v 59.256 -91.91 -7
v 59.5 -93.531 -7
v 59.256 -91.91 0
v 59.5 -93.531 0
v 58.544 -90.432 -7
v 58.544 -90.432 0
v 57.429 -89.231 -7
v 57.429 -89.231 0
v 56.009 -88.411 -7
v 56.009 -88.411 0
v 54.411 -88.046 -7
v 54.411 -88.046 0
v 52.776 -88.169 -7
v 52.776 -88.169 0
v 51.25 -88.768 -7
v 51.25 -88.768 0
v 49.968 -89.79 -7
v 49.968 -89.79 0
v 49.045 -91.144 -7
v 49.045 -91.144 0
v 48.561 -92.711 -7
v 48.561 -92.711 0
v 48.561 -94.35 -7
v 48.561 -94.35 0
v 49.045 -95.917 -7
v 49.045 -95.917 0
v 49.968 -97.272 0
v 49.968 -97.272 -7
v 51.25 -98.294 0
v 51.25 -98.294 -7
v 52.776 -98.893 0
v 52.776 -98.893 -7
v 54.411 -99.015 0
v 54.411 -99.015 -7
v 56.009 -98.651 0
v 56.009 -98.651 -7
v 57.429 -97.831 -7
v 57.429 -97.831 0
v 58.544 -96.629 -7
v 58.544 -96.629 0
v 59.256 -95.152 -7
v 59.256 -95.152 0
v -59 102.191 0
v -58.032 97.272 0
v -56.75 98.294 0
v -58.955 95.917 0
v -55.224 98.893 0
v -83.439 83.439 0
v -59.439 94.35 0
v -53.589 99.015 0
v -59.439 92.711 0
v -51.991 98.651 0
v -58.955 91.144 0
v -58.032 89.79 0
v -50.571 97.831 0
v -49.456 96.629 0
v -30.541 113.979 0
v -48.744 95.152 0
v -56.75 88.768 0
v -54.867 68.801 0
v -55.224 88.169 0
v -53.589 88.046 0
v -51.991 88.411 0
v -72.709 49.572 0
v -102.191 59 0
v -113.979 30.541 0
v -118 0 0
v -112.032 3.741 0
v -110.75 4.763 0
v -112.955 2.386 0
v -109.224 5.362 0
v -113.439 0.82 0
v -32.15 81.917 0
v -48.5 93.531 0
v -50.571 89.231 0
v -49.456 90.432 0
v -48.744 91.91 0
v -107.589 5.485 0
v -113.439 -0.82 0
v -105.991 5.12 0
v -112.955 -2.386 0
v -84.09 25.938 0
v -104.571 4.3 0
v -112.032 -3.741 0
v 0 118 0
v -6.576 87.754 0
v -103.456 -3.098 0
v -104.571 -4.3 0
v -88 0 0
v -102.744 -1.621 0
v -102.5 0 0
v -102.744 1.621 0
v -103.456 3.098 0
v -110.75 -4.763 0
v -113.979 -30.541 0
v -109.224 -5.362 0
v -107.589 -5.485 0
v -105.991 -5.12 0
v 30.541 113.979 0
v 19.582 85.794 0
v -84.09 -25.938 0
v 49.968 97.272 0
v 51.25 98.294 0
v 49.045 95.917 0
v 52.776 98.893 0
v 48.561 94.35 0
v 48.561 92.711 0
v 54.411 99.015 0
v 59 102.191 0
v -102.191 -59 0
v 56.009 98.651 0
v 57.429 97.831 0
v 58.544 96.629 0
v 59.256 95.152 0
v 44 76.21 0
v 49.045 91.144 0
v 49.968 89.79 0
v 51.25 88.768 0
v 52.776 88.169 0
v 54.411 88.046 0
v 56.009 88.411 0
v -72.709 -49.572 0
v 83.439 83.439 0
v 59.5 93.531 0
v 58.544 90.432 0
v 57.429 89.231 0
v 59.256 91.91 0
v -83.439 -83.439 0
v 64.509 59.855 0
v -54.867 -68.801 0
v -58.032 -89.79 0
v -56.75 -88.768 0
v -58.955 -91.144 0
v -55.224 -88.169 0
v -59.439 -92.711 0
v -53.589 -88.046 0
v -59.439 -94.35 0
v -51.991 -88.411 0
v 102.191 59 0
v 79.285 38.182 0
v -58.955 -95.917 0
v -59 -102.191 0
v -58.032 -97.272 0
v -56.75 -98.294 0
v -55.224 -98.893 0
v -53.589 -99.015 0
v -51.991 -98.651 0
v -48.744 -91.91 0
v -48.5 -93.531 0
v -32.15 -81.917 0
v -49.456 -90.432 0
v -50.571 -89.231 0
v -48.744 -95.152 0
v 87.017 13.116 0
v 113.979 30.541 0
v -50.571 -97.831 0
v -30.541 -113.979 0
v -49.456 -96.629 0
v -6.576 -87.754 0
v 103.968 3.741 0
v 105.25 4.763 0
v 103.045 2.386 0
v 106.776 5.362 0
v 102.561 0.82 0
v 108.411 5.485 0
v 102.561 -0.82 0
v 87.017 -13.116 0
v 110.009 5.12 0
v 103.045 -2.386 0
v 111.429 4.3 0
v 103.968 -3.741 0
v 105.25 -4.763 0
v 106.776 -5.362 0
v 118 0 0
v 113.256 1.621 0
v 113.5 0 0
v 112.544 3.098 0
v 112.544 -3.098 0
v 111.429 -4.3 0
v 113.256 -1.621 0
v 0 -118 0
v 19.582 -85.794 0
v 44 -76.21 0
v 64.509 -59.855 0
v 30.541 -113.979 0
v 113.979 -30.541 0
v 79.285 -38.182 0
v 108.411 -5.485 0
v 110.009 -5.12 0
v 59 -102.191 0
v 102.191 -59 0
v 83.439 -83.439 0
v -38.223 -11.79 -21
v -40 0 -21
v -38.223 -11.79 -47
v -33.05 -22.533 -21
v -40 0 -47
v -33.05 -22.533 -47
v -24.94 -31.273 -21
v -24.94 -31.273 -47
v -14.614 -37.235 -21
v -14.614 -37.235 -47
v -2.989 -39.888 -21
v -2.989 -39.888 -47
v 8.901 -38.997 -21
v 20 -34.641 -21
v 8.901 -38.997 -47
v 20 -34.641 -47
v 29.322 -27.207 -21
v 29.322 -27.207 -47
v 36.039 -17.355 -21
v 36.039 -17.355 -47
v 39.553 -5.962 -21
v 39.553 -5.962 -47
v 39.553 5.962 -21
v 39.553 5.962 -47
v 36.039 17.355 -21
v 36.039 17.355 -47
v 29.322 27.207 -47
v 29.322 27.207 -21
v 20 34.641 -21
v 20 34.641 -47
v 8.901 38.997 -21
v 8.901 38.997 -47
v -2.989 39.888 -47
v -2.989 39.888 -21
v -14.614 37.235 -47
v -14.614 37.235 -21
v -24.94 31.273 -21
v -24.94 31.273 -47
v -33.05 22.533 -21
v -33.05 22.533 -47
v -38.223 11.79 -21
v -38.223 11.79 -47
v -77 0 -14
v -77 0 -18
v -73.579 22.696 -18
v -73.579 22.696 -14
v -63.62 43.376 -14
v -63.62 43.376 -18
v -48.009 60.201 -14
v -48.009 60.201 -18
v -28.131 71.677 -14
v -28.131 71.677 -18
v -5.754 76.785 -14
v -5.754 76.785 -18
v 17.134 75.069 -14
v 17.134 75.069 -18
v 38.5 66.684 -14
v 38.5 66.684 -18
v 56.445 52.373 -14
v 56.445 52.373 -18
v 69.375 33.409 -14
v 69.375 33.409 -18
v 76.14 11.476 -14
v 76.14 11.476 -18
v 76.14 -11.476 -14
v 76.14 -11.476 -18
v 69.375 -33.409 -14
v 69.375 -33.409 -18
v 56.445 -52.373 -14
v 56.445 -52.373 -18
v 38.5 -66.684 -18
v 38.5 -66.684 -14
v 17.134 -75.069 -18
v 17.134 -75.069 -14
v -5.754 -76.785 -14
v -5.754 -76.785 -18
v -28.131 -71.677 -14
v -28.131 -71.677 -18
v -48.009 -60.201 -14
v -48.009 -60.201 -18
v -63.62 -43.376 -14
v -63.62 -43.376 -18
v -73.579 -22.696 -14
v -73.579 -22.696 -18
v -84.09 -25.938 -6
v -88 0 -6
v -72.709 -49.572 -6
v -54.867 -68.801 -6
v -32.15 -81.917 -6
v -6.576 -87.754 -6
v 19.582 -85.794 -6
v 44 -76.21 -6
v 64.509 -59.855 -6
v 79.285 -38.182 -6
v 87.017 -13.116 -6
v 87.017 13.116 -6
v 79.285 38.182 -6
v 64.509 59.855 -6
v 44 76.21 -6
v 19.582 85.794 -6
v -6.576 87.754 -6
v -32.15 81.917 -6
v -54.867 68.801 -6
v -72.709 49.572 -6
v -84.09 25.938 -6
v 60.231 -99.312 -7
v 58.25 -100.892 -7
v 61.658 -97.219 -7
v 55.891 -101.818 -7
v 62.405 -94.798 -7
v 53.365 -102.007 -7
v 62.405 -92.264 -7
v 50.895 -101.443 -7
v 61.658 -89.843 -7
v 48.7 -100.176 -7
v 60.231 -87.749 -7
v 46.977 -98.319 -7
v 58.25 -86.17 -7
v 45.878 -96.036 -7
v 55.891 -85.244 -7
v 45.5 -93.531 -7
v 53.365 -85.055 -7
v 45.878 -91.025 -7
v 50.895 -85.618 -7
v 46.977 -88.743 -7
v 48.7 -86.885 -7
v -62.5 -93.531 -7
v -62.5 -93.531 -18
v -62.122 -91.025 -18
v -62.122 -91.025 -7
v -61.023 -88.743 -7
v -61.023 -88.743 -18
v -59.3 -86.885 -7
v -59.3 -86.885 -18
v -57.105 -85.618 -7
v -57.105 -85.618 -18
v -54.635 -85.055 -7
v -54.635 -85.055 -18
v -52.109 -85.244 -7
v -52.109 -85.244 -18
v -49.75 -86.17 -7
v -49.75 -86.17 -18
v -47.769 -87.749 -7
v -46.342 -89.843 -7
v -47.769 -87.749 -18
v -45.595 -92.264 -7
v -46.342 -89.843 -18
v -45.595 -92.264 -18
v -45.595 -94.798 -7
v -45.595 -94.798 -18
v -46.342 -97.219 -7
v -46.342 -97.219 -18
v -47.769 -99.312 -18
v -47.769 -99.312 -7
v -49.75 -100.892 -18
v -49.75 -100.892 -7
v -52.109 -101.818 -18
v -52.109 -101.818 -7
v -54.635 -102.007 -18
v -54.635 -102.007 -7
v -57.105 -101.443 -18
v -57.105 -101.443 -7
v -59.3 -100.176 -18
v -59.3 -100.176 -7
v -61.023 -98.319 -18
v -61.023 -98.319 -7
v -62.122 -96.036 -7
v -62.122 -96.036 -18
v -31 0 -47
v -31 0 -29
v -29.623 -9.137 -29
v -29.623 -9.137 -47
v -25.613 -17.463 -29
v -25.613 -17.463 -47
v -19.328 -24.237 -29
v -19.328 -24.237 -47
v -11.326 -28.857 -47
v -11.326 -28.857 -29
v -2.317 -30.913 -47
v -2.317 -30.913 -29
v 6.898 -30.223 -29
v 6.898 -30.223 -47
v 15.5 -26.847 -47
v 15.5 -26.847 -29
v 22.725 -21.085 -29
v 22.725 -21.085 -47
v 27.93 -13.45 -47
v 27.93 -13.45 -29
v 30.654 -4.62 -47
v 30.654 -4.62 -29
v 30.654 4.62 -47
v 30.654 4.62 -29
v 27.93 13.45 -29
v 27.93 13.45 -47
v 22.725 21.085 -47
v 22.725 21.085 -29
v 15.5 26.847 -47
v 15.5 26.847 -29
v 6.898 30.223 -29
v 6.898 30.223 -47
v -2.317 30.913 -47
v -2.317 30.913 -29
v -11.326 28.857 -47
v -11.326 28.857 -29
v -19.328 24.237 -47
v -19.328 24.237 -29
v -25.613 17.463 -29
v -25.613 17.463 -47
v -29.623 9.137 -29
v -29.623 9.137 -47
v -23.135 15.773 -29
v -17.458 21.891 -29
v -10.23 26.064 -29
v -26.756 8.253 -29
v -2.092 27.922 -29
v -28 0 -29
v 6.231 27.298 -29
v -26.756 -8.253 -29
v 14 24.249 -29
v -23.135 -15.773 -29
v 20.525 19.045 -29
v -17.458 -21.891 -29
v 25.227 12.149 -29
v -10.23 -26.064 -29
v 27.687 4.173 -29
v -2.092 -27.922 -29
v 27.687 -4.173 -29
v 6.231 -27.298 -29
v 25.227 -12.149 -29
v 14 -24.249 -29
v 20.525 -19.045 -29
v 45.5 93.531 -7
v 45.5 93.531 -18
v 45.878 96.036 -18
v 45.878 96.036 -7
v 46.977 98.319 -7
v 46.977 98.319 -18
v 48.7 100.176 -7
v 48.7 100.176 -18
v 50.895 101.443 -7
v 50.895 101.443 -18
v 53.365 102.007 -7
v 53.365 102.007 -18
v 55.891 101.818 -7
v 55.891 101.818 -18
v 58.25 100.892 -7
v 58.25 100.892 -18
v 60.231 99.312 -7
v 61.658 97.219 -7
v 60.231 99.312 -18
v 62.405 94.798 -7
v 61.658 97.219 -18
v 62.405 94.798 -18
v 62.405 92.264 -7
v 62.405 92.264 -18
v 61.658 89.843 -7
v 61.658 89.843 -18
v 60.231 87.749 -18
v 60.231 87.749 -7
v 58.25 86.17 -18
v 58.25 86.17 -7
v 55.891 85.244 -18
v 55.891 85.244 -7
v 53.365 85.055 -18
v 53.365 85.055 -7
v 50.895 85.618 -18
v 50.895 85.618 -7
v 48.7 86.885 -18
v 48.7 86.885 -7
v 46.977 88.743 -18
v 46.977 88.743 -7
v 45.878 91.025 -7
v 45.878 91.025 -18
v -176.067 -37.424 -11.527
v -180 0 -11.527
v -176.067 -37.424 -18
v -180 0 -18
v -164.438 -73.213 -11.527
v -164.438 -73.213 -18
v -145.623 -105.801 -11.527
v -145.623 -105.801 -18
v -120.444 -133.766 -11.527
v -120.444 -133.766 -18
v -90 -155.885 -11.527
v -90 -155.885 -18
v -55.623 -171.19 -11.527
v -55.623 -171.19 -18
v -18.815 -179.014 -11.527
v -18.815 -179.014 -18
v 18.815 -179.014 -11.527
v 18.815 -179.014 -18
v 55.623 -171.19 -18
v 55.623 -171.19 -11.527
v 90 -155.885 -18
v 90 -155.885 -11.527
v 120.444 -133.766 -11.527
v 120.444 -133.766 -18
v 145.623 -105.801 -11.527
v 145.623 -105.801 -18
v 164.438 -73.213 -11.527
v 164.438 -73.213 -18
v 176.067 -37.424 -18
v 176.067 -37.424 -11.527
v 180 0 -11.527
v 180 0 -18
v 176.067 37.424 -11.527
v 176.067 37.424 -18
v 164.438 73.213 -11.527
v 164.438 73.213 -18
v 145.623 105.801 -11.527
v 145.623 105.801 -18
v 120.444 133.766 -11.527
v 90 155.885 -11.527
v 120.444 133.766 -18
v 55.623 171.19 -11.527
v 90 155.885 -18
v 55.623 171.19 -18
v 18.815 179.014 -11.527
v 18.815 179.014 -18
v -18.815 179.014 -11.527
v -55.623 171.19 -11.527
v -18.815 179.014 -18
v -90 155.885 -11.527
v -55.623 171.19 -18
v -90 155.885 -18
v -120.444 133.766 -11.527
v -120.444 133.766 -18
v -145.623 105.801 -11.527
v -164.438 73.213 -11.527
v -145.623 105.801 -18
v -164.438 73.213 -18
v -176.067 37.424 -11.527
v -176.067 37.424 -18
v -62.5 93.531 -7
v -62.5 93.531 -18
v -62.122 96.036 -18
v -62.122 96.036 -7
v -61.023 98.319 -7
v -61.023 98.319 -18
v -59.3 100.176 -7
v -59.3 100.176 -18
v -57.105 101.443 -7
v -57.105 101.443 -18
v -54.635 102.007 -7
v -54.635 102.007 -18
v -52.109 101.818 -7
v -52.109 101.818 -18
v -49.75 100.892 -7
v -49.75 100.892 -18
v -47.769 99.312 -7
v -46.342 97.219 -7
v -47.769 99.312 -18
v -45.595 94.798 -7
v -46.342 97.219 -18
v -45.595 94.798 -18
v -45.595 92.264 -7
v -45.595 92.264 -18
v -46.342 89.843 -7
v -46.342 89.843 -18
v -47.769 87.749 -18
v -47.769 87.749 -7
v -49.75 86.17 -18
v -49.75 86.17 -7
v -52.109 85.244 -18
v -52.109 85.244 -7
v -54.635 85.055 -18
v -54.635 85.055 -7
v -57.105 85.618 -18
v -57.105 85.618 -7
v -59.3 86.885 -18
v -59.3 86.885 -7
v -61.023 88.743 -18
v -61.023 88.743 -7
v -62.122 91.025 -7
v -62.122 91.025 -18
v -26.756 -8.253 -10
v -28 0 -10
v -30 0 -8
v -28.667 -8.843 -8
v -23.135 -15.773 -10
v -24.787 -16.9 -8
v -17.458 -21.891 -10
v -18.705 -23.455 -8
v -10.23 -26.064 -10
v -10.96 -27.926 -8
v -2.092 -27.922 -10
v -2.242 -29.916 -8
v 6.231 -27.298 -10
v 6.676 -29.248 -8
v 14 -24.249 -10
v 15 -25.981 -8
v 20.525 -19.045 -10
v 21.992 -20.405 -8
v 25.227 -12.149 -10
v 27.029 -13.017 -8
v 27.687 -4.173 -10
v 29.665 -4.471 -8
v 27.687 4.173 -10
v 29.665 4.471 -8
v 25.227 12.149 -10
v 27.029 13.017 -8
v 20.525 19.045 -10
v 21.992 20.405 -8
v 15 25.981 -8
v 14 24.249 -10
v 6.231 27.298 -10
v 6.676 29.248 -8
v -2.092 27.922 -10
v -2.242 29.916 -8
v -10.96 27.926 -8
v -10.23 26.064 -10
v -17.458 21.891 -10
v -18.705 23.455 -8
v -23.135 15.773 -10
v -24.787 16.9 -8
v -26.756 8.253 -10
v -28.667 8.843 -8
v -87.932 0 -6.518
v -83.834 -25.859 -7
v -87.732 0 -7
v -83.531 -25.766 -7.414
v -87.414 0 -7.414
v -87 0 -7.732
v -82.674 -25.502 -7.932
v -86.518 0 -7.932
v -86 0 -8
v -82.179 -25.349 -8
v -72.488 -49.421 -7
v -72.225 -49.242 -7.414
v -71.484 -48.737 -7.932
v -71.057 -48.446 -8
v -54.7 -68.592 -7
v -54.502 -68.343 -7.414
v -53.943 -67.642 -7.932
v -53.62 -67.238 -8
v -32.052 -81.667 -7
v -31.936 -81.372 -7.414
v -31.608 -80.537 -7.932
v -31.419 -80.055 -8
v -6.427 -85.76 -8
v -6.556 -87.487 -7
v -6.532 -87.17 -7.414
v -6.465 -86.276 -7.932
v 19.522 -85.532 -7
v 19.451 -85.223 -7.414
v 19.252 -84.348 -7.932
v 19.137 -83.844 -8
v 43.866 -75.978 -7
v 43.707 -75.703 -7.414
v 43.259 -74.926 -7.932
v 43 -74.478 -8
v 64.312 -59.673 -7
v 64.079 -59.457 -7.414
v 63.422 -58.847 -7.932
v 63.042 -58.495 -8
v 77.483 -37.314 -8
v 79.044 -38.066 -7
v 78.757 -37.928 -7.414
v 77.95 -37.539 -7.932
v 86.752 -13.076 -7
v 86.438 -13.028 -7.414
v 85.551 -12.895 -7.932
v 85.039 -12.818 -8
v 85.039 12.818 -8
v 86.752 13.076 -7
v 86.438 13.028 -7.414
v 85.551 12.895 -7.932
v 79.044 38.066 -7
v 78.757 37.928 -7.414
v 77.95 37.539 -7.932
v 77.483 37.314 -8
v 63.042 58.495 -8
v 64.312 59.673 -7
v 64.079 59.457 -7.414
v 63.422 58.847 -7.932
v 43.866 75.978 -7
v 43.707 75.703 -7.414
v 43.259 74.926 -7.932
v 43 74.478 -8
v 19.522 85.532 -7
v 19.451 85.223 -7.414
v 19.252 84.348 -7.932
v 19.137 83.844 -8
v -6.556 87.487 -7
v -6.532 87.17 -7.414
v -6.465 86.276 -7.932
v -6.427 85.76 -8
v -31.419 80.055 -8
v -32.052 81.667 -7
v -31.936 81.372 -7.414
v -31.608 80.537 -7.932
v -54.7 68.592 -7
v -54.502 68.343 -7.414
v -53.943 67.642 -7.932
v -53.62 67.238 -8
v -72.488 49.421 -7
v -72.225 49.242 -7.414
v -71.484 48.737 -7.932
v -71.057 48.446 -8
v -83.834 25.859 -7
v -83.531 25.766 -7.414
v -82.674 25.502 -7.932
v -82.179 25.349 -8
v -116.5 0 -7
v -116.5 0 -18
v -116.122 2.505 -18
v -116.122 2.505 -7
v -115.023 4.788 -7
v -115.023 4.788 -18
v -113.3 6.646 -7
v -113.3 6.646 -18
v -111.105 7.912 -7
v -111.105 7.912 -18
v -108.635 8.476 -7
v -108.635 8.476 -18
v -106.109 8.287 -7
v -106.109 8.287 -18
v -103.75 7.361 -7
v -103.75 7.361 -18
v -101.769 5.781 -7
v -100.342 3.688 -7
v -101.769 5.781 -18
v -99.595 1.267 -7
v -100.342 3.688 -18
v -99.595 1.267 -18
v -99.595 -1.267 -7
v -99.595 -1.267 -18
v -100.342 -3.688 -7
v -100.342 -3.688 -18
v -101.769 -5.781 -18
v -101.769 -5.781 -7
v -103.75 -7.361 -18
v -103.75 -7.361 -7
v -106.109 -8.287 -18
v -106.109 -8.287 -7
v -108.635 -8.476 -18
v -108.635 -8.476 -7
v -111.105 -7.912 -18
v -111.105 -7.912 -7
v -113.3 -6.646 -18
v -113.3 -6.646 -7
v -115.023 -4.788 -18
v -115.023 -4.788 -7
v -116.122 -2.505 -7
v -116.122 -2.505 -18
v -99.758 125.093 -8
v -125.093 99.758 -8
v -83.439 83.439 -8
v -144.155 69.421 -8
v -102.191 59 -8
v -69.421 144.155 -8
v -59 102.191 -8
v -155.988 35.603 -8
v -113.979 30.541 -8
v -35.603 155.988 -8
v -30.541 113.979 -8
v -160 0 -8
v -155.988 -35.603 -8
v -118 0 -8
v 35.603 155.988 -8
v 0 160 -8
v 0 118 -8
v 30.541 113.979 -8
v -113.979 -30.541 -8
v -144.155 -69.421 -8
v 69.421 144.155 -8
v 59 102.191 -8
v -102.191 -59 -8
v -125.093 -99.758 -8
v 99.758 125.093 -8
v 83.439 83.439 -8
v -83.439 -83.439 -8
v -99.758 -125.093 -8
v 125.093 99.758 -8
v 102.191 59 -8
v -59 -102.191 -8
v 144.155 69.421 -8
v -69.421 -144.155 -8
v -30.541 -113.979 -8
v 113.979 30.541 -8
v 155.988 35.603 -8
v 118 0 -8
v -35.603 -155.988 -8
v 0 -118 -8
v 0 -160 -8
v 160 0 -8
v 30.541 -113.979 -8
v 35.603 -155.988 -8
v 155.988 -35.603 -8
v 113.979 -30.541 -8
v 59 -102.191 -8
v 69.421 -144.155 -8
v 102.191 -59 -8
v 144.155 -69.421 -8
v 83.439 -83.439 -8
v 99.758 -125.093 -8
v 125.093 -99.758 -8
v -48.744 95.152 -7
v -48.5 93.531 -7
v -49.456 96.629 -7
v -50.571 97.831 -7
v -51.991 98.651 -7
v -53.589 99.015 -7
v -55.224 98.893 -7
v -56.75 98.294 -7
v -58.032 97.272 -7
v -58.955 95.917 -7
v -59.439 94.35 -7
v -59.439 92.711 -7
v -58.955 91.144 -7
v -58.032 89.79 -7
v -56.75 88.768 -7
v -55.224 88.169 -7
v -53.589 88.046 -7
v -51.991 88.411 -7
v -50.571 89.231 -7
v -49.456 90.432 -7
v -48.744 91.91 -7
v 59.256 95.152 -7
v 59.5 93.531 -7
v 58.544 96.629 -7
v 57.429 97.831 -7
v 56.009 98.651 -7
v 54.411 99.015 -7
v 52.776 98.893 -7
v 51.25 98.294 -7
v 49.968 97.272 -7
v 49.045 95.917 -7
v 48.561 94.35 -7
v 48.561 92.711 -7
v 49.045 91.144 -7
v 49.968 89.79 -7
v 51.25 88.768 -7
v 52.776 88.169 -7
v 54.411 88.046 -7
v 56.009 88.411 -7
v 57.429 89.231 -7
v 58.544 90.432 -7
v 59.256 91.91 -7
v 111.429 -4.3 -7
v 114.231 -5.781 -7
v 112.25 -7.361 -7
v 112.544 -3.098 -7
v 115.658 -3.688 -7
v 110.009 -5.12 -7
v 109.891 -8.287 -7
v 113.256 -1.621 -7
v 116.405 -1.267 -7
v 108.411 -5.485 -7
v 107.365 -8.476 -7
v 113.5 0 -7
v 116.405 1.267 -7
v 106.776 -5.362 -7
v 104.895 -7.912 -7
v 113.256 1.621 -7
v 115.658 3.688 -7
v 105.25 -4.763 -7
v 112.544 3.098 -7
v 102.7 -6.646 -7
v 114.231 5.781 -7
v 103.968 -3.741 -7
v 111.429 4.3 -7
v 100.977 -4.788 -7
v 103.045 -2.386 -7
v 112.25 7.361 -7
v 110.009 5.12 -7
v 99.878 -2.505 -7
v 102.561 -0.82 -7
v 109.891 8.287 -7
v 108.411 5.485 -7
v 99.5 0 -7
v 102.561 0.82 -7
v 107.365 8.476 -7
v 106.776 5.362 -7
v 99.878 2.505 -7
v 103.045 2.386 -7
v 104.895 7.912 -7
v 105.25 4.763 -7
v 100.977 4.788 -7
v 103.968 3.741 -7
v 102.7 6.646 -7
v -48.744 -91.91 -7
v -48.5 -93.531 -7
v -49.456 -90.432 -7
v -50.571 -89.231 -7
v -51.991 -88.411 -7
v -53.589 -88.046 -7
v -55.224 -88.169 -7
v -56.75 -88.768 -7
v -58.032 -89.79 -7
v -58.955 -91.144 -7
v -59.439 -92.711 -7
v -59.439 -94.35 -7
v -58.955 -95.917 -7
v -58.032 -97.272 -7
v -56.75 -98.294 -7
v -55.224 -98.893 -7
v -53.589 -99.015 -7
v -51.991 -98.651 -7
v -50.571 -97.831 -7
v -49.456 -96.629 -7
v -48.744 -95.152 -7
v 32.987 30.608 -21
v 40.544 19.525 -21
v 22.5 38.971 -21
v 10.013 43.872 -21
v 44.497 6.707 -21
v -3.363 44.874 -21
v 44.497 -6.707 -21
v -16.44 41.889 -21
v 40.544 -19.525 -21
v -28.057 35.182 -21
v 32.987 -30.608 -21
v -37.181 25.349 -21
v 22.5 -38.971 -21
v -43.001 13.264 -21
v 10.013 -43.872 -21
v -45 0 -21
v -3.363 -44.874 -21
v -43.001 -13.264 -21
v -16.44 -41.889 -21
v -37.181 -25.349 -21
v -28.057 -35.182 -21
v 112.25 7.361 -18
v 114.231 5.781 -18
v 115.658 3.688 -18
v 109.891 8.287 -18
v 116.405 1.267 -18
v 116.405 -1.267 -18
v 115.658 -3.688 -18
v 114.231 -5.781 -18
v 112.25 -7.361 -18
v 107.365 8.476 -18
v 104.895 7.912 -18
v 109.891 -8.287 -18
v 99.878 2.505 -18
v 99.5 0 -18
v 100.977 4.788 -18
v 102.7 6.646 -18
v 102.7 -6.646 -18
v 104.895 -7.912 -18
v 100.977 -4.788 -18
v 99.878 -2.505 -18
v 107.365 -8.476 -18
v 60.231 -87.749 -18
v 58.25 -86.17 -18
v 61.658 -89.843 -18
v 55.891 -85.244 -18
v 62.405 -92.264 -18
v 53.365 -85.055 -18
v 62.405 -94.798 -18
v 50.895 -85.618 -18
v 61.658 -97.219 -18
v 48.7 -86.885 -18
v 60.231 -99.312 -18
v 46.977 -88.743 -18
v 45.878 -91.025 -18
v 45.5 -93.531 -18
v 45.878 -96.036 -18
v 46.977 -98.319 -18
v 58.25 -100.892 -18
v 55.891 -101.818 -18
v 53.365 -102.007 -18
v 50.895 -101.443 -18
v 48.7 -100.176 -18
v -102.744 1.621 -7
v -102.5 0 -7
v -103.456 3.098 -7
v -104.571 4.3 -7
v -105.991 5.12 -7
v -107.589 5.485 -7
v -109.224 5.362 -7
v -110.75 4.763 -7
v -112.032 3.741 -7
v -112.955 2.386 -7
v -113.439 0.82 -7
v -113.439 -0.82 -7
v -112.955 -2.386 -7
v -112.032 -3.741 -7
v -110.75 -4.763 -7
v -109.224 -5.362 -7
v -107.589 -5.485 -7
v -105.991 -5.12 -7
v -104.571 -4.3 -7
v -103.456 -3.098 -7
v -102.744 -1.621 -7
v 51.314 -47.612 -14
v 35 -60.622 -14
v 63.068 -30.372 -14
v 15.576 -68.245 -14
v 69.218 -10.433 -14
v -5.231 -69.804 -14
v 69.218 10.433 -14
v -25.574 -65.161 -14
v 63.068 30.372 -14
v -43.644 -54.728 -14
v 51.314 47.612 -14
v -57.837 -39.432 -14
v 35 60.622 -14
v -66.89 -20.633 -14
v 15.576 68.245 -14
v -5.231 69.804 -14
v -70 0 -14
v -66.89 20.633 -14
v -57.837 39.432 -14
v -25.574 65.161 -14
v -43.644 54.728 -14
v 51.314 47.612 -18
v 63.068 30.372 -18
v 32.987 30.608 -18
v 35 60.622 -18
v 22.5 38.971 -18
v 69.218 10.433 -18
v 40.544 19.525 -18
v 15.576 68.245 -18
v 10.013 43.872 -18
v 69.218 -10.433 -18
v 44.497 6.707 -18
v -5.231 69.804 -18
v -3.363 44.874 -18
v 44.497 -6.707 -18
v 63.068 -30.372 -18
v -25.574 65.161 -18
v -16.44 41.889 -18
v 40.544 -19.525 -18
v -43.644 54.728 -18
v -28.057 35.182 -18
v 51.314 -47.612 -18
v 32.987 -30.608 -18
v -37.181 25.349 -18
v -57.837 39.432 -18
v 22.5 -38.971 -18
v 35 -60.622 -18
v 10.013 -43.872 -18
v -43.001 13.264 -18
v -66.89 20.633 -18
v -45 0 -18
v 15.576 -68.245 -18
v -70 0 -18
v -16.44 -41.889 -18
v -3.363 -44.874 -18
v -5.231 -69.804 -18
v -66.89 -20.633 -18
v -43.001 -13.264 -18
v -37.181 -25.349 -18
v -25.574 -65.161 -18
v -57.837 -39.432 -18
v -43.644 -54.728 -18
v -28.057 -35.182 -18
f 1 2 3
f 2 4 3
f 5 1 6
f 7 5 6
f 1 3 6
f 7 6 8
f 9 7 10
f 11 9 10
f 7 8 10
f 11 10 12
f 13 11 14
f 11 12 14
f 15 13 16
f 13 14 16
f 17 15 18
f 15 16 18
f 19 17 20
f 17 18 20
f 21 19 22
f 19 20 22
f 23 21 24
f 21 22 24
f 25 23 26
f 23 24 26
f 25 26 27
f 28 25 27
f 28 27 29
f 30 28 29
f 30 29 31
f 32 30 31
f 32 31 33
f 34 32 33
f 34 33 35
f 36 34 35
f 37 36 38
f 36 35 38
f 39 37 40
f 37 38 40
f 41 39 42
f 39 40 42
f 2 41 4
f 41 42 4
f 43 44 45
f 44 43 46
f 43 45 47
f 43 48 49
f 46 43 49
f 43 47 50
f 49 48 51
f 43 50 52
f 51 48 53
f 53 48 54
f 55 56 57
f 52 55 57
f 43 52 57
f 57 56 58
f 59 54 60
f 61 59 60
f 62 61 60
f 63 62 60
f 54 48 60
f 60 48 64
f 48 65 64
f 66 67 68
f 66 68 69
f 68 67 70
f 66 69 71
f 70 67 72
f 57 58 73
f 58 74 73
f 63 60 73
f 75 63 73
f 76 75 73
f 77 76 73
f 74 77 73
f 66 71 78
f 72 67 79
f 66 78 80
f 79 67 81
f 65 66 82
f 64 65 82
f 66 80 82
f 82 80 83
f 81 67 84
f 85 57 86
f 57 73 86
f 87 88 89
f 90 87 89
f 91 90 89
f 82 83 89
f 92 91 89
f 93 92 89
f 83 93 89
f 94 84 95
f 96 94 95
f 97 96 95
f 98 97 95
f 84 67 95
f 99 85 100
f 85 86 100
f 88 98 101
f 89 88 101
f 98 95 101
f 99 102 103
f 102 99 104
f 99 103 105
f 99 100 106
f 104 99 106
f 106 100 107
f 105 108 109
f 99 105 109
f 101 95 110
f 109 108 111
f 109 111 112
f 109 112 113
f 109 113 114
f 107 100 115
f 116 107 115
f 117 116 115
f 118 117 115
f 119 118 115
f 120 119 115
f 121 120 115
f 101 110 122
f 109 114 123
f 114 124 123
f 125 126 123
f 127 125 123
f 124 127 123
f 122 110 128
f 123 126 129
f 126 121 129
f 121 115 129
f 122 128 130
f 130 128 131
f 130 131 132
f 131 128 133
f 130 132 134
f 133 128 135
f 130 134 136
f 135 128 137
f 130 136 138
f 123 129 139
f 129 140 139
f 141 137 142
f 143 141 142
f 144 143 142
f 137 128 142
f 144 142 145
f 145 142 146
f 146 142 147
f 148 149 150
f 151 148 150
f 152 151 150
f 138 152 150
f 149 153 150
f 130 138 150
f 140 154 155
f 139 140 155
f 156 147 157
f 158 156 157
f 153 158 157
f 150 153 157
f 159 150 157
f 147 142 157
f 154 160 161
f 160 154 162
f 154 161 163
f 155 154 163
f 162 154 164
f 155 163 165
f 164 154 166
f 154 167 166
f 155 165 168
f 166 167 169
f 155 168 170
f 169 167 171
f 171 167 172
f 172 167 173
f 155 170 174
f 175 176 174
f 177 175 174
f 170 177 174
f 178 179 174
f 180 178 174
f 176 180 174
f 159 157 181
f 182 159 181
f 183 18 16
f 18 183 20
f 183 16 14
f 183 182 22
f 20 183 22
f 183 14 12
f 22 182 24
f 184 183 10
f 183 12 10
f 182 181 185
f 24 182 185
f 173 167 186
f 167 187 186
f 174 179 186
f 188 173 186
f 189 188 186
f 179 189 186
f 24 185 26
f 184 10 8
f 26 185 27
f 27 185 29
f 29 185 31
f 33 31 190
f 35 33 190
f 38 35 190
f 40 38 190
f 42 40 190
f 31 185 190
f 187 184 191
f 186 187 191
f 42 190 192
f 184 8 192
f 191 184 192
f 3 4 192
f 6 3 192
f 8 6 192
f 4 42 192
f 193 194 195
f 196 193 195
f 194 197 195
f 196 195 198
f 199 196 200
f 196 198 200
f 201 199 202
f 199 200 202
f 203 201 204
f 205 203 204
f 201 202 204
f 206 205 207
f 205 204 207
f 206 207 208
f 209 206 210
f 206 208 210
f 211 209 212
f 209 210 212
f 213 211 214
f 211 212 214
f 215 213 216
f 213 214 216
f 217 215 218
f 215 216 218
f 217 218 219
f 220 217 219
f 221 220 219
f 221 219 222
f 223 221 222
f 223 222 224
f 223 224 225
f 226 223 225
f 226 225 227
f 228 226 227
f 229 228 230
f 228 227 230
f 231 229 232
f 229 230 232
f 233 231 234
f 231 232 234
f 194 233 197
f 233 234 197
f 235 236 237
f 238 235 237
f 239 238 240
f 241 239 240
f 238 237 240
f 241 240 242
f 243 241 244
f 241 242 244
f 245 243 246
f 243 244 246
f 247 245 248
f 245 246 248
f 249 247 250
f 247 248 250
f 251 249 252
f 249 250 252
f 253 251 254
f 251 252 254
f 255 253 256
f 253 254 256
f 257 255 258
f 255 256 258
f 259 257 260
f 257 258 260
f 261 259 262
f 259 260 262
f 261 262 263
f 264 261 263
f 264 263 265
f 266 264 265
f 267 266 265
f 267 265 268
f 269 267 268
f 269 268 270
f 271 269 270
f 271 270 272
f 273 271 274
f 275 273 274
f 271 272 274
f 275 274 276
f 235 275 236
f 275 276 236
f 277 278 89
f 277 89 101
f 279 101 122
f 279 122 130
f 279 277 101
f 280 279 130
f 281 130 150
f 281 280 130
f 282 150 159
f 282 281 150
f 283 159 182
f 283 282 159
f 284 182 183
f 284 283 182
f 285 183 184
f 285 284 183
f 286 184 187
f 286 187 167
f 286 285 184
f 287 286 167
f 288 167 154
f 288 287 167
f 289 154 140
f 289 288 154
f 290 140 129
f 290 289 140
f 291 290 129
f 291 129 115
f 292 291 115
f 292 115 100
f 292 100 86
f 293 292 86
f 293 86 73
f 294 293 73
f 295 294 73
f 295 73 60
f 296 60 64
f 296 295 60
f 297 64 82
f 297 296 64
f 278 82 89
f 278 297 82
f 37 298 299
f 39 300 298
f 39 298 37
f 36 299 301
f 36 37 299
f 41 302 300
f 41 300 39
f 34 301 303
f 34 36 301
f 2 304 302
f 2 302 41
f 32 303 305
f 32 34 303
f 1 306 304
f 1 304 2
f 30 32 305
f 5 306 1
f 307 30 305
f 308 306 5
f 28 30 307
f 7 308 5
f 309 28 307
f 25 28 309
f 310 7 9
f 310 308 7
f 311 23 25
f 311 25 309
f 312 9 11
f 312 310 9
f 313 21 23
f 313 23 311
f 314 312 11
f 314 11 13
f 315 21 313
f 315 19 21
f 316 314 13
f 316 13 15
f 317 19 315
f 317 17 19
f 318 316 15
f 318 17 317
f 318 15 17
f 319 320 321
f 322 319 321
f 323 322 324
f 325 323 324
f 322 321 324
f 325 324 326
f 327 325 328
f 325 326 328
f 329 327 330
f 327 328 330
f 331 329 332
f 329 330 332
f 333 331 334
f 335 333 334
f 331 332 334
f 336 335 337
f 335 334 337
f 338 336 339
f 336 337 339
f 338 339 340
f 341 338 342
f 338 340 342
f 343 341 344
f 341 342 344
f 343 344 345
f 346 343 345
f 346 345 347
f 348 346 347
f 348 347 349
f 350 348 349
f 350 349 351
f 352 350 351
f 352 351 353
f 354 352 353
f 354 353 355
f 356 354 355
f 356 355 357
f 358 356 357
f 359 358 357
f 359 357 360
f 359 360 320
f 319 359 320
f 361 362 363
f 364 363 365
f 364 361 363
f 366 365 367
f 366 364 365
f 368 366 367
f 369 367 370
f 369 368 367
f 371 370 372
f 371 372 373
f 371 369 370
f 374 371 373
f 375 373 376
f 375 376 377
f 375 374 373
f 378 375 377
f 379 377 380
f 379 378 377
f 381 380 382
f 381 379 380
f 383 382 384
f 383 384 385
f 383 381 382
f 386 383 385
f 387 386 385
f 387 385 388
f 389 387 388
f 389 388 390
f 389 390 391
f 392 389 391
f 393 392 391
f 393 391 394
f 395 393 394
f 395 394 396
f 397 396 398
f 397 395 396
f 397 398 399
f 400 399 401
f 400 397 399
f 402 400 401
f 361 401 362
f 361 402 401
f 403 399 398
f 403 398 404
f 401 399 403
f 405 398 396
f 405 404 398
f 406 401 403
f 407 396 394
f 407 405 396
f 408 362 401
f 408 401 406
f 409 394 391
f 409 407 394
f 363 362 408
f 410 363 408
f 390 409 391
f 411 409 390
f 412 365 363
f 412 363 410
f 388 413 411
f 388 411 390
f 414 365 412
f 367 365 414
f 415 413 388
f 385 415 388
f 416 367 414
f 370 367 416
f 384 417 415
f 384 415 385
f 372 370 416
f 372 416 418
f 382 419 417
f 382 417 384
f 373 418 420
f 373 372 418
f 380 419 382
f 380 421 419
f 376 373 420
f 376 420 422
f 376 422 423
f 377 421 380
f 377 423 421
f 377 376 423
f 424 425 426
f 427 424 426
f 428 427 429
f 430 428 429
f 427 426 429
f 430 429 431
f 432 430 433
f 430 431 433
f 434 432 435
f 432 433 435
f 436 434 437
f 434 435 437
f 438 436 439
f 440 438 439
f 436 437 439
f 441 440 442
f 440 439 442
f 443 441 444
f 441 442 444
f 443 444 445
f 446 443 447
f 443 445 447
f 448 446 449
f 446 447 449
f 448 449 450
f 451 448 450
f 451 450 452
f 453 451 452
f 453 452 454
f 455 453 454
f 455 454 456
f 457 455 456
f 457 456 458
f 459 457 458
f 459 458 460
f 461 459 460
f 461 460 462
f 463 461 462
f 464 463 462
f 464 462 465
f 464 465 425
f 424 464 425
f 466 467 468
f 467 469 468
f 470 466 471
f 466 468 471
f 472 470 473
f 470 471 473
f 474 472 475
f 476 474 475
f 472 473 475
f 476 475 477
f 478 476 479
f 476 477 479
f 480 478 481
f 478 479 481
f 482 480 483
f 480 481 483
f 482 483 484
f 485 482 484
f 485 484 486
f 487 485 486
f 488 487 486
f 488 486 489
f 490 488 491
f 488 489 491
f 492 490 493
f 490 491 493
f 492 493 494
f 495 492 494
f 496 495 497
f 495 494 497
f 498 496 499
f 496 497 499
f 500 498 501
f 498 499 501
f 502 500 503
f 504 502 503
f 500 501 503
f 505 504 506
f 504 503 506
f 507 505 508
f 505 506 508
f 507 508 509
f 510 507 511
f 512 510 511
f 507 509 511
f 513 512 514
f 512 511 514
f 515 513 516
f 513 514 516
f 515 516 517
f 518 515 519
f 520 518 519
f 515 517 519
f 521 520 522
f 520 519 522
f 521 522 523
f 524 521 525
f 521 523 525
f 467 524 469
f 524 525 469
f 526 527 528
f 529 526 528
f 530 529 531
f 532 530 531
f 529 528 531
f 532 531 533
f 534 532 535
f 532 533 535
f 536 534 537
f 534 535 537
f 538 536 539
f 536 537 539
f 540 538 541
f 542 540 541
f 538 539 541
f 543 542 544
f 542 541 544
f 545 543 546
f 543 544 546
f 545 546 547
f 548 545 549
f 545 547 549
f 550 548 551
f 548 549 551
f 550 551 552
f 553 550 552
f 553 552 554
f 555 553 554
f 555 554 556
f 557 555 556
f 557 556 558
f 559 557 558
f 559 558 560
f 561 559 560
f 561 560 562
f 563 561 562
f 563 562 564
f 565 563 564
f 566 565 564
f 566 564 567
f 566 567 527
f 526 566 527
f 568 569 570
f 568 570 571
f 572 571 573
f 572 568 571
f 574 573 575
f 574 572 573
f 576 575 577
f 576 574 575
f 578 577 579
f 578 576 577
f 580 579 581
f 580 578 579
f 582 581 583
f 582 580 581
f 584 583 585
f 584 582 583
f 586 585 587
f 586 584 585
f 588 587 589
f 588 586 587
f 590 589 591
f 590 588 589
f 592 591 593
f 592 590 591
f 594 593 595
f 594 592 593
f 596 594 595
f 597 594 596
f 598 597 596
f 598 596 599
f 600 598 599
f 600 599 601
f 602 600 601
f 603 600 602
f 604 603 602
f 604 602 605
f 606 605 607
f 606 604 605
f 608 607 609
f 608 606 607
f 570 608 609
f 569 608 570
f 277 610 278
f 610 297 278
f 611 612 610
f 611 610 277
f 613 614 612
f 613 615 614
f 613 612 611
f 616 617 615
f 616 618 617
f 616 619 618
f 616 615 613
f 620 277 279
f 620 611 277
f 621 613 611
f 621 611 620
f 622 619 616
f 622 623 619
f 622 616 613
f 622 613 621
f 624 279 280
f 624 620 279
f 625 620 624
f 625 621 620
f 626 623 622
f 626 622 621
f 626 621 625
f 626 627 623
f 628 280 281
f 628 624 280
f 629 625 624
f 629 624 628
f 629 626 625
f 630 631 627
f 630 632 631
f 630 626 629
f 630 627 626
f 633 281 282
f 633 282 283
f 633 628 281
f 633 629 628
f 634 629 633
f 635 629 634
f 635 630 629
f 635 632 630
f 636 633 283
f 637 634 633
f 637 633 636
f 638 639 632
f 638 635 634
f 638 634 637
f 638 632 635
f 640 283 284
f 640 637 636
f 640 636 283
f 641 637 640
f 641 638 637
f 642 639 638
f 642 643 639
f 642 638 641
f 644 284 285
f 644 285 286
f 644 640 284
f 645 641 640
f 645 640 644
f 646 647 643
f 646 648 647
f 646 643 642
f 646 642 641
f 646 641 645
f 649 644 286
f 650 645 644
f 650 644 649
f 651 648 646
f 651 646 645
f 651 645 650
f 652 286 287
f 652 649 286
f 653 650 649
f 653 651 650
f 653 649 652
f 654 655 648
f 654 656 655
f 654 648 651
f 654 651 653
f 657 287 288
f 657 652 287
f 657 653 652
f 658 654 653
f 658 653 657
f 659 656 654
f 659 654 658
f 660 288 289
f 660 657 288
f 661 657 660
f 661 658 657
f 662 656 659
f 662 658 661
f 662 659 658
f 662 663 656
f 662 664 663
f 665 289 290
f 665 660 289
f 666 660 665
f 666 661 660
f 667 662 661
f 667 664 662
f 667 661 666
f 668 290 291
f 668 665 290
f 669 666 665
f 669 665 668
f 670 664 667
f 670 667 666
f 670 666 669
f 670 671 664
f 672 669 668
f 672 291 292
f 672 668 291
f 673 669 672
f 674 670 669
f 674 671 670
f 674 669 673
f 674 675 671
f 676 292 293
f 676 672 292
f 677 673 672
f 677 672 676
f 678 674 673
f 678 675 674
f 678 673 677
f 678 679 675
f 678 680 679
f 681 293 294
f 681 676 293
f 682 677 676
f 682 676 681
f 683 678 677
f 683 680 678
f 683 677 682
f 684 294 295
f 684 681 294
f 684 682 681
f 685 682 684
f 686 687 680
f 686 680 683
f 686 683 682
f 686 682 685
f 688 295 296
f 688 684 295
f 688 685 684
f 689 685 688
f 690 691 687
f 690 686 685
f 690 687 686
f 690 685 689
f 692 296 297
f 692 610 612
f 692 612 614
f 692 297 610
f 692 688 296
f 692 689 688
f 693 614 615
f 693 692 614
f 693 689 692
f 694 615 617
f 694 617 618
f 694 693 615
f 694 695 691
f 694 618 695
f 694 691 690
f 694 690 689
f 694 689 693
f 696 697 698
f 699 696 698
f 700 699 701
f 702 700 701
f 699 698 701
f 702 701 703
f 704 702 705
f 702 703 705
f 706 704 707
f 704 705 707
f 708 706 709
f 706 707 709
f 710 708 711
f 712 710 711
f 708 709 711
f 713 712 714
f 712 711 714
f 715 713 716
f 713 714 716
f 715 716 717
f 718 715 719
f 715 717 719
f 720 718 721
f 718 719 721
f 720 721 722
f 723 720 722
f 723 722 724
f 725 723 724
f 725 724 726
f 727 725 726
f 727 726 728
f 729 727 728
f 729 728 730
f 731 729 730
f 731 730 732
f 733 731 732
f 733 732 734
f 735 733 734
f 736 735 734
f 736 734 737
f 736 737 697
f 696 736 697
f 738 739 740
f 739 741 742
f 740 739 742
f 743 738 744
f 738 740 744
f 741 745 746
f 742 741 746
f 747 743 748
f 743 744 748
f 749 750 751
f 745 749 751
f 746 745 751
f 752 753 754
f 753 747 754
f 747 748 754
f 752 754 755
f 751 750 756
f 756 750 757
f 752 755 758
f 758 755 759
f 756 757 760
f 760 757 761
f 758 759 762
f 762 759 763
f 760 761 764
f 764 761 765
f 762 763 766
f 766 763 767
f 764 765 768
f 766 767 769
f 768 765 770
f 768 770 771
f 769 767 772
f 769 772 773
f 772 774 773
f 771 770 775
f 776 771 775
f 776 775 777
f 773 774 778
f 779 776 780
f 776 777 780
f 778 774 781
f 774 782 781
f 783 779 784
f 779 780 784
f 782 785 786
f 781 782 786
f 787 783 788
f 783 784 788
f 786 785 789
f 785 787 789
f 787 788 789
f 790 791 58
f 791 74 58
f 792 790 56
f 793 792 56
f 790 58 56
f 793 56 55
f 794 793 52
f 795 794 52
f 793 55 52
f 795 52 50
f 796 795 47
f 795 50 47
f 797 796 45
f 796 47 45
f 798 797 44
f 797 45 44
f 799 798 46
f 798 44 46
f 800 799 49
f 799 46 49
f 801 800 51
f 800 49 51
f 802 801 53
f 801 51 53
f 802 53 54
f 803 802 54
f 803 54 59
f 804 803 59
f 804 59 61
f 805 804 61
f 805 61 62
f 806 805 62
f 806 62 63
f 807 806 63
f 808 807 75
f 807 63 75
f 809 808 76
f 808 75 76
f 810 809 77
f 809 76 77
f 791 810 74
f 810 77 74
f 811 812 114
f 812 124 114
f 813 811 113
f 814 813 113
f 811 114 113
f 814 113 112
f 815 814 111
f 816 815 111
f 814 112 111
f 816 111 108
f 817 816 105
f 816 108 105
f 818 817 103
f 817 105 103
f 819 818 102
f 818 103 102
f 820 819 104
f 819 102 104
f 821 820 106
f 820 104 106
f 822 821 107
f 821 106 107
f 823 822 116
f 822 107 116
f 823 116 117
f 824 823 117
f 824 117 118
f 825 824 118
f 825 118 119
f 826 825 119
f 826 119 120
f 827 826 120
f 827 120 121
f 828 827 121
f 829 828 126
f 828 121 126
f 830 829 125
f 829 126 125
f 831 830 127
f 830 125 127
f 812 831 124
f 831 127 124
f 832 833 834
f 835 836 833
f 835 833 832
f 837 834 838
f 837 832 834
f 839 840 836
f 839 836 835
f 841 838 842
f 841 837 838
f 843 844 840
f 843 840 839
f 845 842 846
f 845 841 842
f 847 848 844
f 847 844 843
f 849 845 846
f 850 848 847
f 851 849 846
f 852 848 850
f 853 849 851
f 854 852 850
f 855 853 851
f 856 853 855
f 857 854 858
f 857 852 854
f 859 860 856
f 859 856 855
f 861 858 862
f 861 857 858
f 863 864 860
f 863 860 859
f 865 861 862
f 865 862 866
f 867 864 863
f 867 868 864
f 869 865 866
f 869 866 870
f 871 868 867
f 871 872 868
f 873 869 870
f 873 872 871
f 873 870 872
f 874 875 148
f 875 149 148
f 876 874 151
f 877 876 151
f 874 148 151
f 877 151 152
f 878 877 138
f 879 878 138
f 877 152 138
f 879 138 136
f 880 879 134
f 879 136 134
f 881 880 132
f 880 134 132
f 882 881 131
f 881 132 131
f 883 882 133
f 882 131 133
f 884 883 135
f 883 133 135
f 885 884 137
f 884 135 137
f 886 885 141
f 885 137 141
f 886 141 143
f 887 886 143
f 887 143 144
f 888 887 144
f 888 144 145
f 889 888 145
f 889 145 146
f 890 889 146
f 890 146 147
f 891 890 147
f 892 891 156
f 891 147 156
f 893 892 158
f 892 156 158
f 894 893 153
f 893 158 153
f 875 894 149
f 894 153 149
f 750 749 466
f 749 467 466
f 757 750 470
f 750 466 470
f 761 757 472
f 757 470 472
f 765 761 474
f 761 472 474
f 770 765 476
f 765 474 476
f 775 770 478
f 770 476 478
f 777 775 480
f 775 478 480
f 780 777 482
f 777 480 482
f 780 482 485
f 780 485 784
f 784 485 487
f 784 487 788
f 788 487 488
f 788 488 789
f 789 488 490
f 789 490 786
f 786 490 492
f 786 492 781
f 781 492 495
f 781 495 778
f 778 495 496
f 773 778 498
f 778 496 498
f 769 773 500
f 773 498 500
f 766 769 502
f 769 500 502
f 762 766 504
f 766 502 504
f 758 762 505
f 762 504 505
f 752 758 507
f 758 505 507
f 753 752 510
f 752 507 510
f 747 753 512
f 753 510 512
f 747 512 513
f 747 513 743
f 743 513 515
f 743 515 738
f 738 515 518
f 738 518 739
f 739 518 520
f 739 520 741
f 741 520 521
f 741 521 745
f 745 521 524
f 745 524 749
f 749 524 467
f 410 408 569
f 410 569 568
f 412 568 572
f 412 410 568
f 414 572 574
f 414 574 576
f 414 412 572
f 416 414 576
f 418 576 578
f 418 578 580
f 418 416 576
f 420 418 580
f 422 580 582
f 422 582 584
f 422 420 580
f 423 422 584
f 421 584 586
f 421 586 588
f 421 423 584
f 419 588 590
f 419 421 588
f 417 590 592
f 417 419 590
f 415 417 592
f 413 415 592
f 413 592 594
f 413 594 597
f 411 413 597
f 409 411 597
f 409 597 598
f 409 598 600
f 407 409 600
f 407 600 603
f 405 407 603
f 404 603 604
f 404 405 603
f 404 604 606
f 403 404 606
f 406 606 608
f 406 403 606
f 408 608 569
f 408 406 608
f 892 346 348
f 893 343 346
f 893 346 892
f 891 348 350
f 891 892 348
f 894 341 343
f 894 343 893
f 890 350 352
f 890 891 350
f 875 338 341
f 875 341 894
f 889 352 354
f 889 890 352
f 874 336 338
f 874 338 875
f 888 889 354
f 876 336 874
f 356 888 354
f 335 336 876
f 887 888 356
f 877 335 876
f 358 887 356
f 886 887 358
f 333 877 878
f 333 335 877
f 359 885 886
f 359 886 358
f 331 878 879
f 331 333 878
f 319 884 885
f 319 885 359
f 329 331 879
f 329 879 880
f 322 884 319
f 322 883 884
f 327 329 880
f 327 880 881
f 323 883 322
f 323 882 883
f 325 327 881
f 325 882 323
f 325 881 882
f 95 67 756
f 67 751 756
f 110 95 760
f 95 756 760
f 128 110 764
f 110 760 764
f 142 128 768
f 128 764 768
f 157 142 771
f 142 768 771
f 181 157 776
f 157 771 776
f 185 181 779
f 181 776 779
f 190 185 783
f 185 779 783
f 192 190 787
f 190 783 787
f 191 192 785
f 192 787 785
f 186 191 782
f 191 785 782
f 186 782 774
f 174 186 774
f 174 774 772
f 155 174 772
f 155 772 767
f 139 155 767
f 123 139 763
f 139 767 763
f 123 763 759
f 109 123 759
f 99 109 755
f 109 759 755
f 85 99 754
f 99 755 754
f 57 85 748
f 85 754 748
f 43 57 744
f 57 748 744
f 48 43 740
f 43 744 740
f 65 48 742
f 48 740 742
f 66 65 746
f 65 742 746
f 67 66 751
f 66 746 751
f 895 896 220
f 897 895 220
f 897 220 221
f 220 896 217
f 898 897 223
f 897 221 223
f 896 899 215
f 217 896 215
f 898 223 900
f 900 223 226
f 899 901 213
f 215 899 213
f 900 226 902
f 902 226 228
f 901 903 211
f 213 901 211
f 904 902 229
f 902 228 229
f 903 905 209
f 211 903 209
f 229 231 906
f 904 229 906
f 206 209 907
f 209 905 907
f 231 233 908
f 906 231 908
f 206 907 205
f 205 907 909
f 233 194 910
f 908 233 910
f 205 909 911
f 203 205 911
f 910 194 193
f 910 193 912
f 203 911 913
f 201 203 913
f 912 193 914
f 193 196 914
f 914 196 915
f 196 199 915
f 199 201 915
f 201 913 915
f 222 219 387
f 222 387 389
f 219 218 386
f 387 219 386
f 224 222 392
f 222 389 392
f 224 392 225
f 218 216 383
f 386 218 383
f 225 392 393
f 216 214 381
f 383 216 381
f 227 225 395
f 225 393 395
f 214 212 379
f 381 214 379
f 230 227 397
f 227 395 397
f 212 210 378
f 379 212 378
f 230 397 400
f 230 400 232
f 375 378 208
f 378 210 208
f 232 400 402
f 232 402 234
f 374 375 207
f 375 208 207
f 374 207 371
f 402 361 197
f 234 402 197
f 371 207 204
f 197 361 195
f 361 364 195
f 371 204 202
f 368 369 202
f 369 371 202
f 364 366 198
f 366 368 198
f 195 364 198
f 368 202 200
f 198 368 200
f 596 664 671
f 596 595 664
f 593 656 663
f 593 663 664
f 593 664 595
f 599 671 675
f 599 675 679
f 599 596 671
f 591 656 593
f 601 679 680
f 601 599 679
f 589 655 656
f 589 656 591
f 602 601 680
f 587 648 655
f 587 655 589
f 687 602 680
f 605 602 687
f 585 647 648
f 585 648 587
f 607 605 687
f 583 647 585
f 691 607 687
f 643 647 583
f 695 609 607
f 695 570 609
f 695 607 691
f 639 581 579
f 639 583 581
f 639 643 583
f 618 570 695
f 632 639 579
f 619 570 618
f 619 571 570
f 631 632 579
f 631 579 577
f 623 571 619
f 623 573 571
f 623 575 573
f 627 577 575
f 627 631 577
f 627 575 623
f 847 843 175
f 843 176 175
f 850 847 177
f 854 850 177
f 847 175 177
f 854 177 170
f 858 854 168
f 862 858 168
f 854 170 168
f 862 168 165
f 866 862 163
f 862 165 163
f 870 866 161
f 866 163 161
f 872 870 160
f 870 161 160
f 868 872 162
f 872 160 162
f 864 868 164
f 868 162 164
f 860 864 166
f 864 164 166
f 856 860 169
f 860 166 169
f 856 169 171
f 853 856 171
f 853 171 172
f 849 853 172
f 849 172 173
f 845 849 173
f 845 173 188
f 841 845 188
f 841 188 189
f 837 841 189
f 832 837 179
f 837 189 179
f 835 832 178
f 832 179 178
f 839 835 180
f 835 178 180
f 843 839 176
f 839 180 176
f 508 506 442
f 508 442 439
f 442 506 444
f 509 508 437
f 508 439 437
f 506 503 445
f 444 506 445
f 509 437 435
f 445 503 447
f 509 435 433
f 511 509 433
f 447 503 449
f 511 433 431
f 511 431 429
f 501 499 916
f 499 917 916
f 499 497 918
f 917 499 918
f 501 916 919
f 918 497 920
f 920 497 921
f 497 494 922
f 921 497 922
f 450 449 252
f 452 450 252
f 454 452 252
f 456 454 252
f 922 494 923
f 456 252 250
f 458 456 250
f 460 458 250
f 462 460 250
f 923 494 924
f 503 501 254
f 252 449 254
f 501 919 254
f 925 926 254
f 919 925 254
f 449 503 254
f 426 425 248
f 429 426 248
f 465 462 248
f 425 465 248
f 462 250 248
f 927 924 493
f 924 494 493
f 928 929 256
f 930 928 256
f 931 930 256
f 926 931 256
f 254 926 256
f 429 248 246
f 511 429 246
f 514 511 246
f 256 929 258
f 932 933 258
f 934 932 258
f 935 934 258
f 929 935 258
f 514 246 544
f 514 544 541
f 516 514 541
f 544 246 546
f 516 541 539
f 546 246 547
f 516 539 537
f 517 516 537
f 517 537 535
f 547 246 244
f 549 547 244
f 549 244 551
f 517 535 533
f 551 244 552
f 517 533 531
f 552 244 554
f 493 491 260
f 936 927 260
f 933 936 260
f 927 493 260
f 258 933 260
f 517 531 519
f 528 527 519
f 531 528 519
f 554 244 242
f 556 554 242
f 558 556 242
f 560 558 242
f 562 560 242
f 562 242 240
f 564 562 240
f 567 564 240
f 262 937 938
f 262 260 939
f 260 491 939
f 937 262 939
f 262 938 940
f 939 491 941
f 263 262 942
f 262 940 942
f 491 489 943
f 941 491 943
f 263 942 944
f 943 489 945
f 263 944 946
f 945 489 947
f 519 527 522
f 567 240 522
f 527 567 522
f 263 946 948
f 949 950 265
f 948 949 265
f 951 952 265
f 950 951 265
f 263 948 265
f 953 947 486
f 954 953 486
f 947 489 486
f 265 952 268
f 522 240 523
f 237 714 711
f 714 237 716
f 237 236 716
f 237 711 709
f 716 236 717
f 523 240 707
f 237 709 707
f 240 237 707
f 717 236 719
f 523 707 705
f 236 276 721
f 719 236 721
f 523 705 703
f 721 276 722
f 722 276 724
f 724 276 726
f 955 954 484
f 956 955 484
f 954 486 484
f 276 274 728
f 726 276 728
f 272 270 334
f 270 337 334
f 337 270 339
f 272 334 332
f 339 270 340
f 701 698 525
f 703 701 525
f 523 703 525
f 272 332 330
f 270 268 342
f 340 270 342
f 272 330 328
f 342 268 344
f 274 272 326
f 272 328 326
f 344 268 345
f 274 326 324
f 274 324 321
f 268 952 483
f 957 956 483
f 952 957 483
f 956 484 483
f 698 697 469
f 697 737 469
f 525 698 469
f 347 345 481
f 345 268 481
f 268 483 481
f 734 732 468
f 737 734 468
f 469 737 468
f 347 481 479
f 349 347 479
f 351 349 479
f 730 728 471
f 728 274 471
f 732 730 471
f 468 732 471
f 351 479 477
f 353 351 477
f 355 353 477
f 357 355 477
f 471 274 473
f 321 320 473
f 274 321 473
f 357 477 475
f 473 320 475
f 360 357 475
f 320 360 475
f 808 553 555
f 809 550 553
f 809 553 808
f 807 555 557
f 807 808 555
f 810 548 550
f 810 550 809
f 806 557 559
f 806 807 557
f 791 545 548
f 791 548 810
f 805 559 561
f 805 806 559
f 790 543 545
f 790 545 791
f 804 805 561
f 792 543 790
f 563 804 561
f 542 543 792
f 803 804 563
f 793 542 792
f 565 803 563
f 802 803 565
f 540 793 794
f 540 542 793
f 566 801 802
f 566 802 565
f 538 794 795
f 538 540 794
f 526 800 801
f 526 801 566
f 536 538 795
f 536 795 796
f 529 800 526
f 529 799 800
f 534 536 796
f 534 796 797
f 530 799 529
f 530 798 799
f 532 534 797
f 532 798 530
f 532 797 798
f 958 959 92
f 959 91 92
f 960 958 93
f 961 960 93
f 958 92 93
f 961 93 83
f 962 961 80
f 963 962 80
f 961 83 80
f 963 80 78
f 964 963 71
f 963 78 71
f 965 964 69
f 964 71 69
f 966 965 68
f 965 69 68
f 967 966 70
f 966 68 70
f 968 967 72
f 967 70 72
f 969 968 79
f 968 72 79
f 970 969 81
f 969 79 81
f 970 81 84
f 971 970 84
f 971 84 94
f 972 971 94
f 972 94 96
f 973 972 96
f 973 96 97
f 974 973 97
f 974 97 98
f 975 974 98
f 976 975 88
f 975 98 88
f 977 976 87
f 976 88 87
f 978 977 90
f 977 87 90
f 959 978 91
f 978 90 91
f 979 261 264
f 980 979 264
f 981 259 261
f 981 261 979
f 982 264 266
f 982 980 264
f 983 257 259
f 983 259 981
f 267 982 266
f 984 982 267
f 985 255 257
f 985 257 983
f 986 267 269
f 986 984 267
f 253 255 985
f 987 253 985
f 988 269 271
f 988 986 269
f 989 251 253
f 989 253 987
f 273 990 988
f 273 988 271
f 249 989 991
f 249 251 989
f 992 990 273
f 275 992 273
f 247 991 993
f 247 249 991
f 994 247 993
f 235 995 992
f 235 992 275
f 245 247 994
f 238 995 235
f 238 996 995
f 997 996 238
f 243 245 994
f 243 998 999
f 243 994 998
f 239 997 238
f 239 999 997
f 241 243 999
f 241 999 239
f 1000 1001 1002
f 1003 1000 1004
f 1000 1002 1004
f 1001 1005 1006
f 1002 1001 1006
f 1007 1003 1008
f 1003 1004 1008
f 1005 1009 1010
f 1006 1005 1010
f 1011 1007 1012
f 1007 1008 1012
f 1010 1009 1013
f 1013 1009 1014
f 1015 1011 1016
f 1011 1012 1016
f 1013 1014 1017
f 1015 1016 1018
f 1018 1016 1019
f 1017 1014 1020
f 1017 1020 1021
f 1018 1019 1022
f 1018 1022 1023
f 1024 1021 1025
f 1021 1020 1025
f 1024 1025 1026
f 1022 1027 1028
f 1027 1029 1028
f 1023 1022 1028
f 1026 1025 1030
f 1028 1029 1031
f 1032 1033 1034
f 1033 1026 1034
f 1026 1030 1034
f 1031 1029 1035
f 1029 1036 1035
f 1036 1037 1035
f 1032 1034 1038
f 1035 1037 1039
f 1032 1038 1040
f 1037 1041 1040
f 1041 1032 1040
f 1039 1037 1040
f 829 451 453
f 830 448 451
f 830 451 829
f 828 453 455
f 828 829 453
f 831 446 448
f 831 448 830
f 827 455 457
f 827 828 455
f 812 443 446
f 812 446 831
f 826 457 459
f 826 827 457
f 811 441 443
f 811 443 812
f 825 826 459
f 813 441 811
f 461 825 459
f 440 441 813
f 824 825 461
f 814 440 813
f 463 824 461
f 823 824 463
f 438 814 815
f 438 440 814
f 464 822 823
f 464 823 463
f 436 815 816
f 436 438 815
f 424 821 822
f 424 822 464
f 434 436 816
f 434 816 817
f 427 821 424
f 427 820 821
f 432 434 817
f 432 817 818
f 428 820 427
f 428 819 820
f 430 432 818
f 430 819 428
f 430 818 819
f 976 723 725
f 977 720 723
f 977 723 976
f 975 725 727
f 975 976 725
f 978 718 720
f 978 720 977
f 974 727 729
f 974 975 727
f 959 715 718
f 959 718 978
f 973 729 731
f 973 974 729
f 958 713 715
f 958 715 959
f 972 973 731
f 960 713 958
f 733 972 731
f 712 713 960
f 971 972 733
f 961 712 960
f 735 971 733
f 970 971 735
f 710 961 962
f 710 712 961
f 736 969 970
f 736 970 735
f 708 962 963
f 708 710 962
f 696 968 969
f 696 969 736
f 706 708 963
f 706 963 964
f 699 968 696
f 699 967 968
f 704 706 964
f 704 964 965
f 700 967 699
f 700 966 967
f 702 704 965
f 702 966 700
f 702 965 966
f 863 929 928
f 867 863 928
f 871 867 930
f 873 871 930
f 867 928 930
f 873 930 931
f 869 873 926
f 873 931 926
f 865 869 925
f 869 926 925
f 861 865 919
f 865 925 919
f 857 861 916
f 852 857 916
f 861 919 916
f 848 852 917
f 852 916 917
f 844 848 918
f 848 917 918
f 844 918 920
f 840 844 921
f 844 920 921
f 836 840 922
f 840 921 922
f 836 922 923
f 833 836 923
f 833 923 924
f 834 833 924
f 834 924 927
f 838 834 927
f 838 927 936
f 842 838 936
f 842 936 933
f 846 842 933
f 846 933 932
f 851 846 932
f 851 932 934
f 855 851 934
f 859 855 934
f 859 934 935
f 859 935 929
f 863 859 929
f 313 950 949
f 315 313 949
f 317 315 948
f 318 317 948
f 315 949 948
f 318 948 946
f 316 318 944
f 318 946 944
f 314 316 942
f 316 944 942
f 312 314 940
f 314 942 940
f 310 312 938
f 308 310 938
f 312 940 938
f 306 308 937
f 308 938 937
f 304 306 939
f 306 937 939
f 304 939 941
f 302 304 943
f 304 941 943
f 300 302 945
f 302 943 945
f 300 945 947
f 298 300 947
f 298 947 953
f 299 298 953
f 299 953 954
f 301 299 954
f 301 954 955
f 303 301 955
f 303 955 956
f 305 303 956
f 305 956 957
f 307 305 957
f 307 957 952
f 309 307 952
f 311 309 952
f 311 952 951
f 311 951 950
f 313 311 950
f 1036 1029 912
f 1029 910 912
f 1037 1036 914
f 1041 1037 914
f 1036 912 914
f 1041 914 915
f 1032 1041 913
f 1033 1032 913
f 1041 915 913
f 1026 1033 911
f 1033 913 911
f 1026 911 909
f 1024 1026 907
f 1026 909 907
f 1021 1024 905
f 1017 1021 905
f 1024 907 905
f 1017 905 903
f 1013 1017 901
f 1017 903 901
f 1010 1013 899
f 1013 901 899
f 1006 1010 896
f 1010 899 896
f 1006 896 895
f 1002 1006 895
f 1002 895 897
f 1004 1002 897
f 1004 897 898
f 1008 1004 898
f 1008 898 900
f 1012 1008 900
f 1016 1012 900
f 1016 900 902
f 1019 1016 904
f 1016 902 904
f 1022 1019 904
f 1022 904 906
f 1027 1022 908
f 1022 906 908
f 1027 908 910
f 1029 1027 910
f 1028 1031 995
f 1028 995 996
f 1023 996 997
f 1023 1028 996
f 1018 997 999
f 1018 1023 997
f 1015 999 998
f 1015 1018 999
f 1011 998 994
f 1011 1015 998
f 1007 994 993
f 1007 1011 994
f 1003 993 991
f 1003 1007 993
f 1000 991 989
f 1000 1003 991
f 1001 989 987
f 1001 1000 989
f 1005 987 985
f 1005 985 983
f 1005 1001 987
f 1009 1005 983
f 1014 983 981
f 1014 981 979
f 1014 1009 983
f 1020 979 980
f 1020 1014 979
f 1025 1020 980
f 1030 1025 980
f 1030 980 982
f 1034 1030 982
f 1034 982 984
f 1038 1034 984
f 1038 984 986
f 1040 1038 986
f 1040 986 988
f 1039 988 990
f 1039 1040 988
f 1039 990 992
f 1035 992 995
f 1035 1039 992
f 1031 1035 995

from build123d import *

# Parameters (mm, degrees)
SKETCH_3_R                = 77
SKETCH_3_R_2              = 70
CUT_EXTRUDE_1_DEPTH       = 4
HOLE_WIZARD_1_D           = 11
HOLE_WIZARD_1_CBORE_D     = 17
HOLE_WIZARD_1_CBORE_DEPTH = 11
FILLET_1_R                = 2
CHAMFER_1_SIZE            = 2


with BuildPart() as part:
    # 草图1 → 旋转1 (revolve)
    with BuildSketch(Plane(origin=(0, 0, 0), x_dir=(0, 0, -1), z_dir=(1, 0, 0)), mode=Mode.PRIVATE) as revolve_1_sk:
        Polygon((0, 0), (0, 118), (8, 118), (8, 160), (11.526539614, 180), (18, 180), (18, 45), (21, 45), (21, 40), (47, 40), (47, 0), align=None)
    revolve(revolve_1_sk.sketch.rotate(Axis((0, 0, -47), (0, 0, 1)), 90), axis=Axis((0, 0, -47), (0, 0, 1)))

    # 草图2 → 切除-旋转1 (revolve, cut)
    with BuildSketch(Plane(origin=(0, 0, 0), x_dir=(0, 0, -1), z_dir=(1, 0, 0)), mode=Mode.PRIVATE) as cut_revolve_1_sk:
        Polygon((0, 0), (0, 88), (8, 88), (8, 28), (29, 28), (29, 31), (47, 31), (47, 0), align=None)
    revolve(cut_revolve_1_sk.sketch.rotate(Axis((0, 0, -47), (0, 0, 1)), 90), axis=Axis((0, 0, -47), (0, 0, 1)), mode=Mode.SUBTRACT)

    # 草图3 → 切除-拉伸1 (cut)
    with BuildSketch(Plane(origin=(0, 0, -18), x_dir=(-1, 0, 0), z_dir=(0, 0, -1))):
        Circle(SKETCH_3_R)
        Circle(SKETCH_3_R_2, mode=Mode.SUBTRACT)
    extrude(amount=-CUT_EXTRUDE_1_DEPTH, mode=Mode.SUBTRACT)

    # 孔1 (through all)
    with Locations(Plane(origin=(0, 0, -18), x_dir=(-1, 0, 0), z_dir=(0, 0, -1))):
        with Locations((54, 93.530743609), (108, 0), (54, -93.530743609), (-54, -93.530743609), (-108, 0), (-54, 93.530743609)):
            CounterBoreHole(HOLE_WIZARD_1_D / 2, HOLE_WIZARD_1_CBORE_D / 2, HOLE_WIZARD_1_CBORE_DEPTH)

    # 圆角1
    fillet_1_edges = [part.edges().sort_by_distance(p)[0] for p in [
        (88, 0, -8),
    ]]
    fillet(fillet_1_edges, radius=FILLET_1_R)

    # 倒角1
    chamfer_1_edges = [part.edges().sort_by_distance(p)[0] for p in [
        (28, 0, -8),
    ]]
    chamfer(chamfer_1_edges, length=CHAMFER_1_SIZE)


solid = part.part
